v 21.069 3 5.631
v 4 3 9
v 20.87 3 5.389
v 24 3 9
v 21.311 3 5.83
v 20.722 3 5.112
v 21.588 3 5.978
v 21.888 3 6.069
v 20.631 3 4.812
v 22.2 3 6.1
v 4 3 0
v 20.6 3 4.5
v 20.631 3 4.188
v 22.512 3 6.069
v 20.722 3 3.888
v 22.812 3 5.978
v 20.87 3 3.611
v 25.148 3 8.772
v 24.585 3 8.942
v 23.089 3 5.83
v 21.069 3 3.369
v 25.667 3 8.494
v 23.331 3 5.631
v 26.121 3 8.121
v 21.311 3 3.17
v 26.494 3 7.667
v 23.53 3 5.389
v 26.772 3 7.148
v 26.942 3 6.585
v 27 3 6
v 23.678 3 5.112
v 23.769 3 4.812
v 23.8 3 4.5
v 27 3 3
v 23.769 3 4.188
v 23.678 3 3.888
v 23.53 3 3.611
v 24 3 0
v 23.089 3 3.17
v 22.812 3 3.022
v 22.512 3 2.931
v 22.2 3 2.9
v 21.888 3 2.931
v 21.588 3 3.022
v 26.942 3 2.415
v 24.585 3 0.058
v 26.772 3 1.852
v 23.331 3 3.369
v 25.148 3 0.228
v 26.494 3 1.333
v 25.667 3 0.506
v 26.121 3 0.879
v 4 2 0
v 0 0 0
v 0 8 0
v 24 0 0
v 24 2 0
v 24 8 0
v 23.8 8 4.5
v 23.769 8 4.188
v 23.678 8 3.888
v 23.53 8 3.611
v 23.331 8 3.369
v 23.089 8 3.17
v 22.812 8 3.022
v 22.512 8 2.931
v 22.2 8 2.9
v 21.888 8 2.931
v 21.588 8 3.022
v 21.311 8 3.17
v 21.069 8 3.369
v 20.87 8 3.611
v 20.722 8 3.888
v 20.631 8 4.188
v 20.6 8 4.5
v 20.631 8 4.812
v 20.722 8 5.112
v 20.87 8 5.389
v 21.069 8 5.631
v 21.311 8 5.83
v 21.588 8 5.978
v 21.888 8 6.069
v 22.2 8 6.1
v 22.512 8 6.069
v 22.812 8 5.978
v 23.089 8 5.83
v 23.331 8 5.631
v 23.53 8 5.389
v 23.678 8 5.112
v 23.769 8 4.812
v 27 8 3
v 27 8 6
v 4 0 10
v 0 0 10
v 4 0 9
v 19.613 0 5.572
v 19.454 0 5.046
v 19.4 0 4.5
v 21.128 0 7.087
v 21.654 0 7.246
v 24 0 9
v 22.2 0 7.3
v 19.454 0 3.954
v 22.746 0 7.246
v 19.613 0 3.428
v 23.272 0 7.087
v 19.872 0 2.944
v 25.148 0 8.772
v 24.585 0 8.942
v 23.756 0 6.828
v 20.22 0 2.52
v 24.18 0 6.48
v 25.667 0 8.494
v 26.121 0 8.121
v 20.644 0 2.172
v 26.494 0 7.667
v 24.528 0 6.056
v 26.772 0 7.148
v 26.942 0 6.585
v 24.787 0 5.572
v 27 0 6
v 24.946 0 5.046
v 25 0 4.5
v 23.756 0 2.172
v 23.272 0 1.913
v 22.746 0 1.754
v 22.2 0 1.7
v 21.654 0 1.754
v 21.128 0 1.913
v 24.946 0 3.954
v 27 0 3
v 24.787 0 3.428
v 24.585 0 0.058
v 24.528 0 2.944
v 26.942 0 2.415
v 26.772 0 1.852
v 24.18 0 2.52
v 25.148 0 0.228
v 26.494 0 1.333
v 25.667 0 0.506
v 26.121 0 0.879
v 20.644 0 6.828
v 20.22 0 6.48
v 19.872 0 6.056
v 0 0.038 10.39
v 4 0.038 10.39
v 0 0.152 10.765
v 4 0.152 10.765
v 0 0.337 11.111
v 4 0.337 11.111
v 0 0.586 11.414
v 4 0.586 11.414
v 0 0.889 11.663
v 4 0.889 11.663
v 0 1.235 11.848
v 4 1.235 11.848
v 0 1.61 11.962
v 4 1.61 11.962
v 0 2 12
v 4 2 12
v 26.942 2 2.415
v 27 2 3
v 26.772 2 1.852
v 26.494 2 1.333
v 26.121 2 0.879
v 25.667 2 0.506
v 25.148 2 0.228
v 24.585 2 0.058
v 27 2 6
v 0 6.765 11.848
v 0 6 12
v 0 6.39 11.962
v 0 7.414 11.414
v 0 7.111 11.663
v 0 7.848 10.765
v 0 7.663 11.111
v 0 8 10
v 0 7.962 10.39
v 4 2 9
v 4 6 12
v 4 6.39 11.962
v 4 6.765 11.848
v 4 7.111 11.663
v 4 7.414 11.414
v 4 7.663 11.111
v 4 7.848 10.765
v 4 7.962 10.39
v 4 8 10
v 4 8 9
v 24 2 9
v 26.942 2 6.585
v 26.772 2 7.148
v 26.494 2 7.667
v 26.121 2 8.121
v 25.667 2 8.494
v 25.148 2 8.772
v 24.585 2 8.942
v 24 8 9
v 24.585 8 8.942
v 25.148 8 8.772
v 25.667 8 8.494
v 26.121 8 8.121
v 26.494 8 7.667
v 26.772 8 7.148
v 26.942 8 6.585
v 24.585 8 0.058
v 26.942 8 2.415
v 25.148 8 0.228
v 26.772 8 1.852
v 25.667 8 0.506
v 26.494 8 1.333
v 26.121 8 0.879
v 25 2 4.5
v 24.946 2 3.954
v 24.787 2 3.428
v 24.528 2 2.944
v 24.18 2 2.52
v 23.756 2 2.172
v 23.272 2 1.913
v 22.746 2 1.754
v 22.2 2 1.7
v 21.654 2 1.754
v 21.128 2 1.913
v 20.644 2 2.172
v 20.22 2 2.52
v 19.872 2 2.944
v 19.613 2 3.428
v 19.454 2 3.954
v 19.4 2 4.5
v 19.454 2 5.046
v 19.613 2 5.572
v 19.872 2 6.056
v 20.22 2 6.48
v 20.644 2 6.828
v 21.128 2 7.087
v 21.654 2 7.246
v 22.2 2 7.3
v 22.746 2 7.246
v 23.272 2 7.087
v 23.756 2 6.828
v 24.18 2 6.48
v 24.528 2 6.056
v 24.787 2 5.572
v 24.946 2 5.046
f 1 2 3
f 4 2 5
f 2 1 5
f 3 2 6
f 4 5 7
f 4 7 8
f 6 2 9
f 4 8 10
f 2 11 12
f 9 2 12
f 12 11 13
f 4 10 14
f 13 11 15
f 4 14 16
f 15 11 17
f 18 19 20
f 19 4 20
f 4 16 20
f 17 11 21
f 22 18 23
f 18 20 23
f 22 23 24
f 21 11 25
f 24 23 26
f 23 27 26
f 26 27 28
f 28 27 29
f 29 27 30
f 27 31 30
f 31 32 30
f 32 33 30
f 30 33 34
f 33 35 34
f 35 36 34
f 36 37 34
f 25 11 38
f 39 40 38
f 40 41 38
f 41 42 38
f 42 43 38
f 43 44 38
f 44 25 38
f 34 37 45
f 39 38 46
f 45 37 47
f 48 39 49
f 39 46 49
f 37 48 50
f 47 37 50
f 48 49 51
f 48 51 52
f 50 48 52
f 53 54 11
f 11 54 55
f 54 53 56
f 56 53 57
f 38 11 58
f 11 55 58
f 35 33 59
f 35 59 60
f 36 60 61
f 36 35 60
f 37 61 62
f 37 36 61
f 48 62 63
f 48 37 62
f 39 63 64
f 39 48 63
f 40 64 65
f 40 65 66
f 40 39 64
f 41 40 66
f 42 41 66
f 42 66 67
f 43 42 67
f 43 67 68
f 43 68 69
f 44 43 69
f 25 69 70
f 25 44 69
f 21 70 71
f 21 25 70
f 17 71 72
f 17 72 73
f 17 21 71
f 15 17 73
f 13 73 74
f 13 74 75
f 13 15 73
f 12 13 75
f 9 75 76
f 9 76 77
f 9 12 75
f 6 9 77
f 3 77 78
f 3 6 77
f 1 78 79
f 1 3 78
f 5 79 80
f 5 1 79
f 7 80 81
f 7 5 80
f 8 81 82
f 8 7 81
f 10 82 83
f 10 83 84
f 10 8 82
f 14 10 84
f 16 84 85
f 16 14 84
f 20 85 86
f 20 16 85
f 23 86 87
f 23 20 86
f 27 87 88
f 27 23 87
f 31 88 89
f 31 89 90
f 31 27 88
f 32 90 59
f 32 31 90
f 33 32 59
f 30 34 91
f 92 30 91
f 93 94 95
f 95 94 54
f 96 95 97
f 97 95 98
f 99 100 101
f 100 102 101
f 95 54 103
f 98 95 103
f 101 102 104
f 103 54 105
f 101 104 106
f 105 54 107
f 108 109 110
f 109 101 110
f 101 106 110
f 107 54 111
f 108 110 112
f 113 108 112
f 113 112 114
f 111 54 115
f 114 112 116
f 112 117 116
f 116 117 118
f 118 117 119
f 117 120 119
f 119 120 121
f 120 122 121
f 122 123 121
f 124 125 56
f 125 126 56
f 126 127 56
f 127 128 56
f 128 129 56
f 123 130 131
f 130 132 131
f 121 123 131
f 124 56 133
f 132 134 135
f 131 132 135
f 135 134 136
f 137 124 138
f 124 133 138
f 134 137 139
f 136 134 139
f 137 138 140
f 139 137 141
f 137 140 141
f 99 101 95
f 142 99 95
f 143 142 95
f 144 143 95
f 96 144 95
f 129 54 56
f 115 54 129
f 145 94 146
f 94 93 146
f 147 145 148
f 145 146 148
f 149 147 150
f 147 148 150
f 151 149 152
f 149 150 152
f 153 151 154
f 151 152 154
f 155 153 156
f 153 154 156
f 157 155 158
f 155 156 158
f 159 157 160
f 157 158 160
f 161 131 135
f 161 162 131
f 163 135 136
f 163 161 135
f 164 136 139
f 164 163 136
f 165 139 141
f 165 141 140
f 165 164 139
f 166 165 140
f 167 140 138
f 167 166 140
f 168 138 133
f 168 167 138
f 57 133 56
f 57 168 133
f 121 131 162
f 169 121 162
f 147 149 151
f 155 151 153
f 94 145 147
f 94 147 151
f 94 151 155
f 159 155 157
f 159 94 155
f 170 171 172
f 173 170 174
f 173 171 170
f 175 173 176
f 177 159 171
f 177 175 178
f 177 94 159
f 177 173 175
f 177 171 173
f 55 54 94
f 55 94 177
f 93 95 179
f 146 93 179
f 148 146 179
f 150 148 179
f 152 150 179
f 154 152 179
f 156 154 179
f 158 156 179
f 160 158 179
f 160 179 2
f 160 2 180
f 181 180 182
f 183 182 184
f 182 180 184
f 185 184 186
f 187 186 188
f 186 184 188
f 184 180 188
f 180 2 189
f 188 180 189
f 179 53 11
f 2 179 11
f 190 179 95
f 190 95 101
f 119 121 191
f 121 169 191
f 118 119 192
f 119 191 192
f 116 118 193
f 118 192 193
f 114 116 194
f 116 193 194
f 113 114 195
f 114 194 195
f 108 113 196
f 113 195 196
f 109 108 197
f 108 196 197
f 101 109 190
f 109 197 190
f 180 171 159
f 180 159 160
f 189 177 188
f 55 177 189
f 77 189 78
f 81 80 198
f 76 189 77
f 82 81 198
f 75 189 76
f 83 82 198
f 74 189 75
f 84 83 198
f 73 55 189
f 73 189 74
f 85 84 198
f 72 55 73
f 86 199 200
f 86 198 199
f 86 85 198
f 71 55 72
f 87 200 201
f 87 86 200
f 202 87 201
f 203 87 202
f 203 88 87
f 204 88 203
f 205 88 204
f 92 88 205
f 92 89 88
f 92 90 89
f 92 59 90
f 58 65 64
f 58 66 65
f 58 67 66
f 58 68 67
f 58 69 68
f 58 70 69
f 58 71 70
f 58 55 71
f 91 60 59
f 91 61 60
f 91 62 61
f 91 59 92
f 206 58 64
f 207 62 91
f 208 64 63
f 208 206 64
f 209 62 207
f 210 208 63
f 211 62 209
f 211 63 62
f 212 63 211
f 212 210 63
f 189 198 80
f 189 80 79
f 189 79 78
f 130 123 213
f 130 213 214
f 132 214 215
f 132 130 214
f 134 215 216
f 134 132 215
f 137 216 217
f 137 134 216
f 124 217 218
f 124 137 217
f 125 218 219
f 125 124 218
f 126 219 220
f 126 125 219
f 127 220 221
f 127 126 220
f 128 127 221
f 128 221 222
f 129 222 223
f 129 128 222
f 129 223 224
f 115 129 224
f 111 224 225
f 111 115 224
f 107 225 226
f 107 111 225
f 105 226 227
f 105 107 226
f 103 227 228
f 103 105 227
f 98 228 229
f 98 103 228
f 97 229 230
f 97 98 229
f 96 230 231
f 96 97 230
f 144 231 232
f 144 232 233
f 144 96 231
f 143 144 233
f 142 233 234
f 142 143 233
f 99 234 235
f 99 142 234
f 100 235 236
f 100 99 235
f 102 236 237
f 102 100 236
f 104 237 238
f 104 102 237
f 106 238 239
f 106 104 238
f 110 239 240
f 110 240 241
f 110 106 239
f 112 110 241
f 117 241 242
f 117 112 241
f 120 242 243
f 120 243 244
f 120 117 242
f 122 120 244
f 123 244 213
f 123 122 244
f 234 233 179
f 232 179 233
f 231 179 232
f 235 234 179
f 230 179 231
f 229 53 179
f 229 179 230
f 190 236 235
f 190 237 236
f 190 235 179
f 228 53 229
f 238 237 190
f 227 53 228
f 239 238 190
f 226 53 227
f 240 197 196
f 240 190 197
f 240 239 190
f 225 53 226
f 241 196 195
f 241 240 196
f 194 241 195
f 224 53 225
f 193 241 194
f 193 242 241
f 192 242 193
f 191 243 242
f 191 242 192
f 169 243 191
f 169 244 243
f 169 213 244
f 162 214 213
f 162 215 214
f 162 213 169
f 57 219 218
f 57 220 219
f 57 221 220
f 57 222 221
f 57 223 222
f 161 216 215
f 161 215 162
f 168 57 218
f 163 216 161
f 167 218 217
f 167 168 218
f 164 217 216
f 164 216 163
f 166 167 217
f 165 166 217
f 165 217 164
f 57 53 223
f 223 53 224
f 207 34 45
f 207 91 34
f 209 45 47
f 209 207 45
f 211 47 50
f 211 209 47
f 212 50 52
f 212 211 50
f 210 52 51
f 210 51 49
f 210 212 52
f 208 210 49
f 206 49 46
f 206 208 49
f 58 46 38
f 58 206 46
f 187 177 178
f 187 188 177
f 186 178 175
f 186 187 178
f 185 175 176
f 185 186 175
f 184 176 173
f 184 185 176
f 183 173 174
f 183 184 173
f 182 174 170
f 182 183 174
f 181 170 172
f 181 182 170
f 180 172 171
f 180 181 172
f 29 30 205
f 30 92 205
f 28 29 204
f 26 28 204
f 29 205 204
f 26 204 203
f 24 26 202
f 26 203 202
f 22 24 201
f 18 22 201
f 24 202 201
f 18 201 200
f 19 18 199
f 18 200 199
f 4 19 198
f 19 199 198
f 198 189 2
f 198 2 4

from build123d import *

# Parameters (mm, degrees)
CYLINDER001_R     = 1.6
CYLINDER001_DEPTH = 5
BOX001_W          = 27
BOX001_H          = 5
BOX001_DEPTH      = 9
FILLET_R          = 3
BOX002_W          = 4
BOX002_H          = 8
BOX002_DEPTH      = 12
FILLET002_R       = 2
CYLINDER_R        = 2.8
CYLINDER_DEPTH    = 2
BOX_W             = 27
BOX_H             = 2
BOX_DEPTH         = 9
FILLET001_R       = 3


with BuildPart() as screw_hole:
    # Cylinder001 → Cylinder001 (new body)
    with BuildSketch(Plane(origin=(22.2, 3, 4.5), x_dir=(1, 0, 0), z_dir=(0, 1, 0))):
        Circle(CYLINDER001_R)
    extrude(amount=CYLINDER001_DEPTH)


with BuildPart() as back_cut:
    # Box001 → Box001 (new body)
    with BuildSketch(Plane(origin=(0, 3, 0), x_dir=(1, 0, 0), z_dir=(0, 0, 1))):
        with Locations((13.5, 2.5)):
            Rectangle(BOX001_W, BOX001_H)
    extrude(amount=BOX001_DEPTH)

    # Fillet
    fillet_edges = [back_cut.edges().sort_by_distance(p)[0] for p in [
        (27, 5.5, 9),
        (27, 5.5, 0),
    ]]
    fillet(fillet_edges, radius=FILLET_R)

    # Cut001: cut screw hole
    add(screw_hole.part, mode=Mode.SUBTRACT)


with BuildPart() as glue_cube_fillet:
    # Box002 → Box002 (new body)
    with BuildSketch(Plane.XY):
        with Locations((2, 4)):
            Rectangle(BOX002_W, BOX002_H)
    extrude(amount=BOX002_DEPTH)

    # Fillet002
    fillet002_edges = [glue_cube_fillet.edges().sort_by_distance(p)[0] for p in [
        (2, 0, 12),
        (2, 8, 12),
    ]]
    fillet(fillet002_edges, radius=FILLET002_R)


with BuildPart() as pass_hole:
    # Cylinder → Cylinder (new body)
    with BuildSketch(Plane(origin=(22.2, 0, 4.5), x_dir=(1, 0, 0), z_dir=(0, 1, 0))):
        Circle(CYLINDER_R)
    extrude(amount=CYLINDER_DEPTH)


with BuildPart() as power_socket_screw_connector:
    # Box → Box (new body)
    with BuildSketch(Plane.XY):
        with Locations((13.5, 1)):
            Rectangle(BOX_W, BOX_H)
    extrude(amount=BOX_DEPTH)

    # Fillet001
    fillet001_edges = [power_socket_screw_connector.edges().sort_by_distance(p)[0] for p in [
        (27, 1, 9),
        (27, 1, 0),
    ]]
    fillet(fillet001_edges, radius=FILLET001_R)

    # Cut: cut pass hole
    add(pass_hole.part, mode=Mode.SUBTRACT)

    # Fusion: union back cut, glue cube fillet
    add(back_cut.part)
    add(glue_cube_fillet.part)


solid = power_socket_screw_connector.part
